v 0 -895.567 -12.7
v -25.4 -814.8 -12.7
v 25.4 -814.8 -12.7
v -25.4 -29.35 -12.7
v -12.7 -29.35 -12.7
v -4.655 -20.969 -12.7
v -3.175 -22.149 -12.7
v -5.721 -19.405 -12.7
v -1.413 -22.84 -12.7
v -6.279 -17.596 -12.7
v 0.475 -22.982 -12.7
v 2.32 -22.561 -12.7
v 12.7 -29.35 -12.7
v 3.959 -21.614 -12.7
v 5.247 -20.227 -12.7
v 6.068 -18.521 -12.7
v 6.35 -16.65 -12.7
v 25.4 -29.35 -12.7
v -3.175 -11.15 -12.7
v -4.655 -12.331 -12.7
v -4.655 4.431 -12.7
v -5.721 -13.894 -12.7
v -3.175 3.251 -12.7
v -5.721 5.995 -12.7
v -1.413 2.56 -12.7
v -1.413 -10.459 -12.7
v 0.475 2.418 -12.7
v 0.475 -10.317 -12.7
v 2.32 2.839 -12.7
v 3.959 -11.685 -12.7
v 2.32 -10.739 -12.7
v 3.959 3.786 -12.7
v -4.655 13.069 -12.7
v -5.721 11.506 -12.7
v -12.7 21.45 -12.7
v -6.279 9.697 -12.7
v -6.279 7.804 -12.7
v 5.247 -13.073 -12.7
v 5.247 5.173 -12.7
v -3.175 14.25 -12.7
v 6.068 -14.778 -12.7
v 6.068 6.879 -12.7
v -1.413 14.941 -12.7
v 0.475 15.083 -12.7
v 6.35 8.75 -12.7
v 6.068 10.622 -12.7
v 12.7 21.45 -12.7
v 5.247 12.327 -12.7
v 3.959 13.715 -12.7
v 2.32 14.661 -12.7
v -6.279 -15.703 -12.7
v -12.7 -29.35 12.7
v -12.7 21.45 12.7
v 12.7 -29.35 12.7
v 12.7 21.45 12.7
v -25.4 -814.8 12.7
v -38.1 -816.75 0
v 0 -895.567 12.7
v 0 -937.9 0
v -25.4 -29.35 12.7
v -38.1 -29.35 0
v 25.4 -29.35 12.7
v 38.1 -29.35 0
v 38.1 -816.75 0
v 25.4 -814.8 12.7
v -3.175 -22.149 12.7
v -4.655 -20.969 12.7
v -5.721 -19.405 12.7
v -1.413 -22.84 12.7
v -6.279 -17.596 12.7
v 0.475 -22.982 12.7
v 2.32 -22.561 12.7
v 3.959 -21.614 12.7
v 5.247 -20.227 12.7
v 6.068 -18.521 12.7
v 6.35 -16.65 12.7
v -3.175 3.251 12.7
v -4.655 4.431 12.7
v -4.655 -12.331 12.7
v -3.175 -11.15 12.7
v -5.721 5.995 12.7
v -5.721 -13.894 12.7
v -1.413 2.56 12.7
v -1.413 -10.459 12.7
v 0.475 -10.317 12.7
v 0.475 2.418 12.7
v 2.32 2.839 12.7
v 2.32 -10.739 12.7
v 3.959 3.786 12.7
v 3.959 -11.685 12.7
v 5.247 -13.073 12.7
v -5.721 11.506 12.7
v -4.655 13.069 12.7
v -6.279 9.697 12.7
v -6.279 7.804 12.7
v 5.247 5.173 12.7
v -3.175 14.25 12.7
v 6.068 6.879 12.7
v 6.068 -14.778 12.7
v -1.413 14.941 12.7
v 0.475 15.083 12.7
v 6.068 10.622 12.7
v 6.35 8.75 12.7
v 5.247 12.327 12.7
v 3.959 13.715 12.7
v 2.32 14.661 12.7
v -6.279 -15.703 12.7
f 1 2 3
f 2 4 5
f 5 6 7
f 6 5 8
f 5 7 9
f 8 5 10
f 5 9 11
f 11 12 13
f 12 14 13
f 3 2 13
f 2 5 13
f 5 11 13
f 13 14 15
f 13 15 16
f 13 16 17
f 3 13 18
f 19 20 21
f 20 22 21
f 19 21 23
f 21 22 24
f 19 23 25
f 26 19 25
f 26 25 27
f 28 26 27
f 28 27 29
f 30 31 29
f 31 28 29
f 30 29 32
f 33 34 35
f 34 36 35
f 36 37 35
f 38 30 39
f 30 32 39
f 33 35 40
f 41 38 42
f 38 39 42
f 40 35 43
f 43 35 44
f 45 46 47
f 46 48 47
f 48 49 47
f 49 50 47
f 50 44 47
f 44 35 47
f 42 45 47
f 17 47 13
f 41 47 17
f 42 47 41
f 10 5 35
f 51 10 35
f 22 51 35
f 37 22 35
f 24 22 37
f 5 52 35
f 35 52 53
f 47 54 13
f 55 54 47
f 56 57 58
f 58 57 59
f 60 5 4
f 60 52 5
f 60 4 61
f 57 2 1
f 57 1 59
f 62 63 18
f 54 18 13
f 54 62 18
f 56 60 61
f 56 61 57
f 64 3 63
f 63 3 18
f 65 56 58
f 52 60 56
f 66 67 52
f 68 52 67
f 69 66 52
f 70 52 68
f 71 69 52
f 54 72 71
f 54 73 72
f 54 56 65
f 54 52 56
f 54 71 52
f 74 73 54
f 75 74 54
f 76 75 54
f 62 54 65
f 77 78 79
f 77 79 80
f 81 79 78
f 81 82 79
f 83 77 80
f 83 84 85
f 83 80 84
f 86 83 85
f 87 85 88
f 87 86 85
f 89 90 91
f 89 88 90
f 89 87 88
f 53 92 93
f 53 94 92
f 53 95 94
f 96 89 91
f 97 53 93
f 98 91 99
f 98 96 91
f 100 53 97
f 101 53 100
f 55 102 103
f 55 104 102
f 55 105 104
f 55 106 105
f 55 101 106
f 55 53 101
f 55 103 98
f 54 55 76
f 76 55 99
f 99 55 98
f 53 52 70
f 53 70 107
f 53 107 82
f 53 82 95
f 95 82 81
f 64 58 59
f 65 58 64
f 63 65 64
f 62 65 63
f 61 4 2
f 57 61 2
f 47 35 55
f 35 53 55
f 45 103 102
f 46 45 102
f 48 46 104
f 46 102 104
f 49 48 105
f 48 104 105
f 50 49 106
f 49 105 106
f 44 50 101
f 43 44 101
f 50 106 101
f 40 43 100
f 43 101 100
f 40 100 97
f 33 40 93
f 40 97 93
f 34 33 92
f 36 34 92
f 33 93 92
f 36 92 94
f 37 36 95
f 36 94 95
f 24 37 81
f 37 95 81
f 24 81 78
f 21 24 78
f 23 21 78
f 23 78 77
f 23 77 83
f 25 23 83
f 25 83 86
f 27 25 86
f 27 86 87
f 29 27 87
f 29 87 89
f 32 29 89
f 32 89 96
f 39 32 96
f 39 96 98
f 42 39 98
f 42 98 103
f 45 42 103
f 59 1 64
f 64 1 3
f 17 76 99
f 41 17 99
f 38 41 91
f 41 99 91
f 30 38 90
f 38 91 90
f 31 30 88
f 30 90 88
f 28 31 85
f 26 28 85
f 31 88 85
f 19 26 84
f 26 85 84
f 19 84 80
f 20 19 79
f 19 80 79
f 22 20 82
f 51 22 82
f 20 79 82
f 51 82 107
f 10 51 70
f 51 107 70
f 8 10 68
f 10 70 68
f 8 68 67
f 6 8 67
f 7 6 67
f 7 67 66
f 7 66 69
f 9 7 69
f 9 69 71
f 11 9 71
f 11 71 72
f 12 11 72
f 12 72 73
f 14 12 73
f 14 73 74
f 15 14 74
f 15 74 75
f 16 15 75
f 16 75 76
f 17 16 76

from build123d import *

# Parameters (mm, degrees)
F0_W     = 25.4
F0_H     = 50.8
F1_DEPTH = 12.7
F2_SIZE  = 12.69999
F3_R     = 6.35
F4_DEPTH = 25.401


# Not quite as in the source:
# - a fillet or chamfer is up to 0.001 mm smaller than in the source, because OpenCascade refuses the exact size


with BuildPart() as f1:
    # F0 (on Top) → F1 (new body, symmetric)
    with BuildSketch(Plane.XY):
        Polygon((-12.7, -29.3496451829), (-38.1, -29.3496451829), (-38.1, -816.7496451829), (0, -937.8999237629), (38.1, -816.7496451829), (38.1, -29.3496451829), (12.7, -29.3496451829), align=None)
        with Locations((0, -3.9496451829)):
            Rectangle(F0_W, F0_H)
    extrude(amount=F1_DEPTH, both=True)

    # F2 (size 12.7 in the source; OpenCascade refuses exactly that, so slightly less here)
    f2_edges = [f1.edges().sort_by_distance(p)[0] for p in [
        (38.1, -423.049645, 12.7),
        (19.05, -877.324784, 12.7),
        (-19.05, -877.324784, 12.7),
        (-38.1, -423.049645, 12.7),
        (19.05, -877.324784, -12.7),
        (-38.1, -423.049645, -12.7),
        (-19.05, -877.324784, -12.7),
        (38.1, -423.049645, -12.7),
    ]]
    chamfer(f2_edges, length=F2_SIZE)

    # F3 (on face) → F4 (cut, through all)
    with BuildSketch(Plane.XY.offset(12.7)):
        with Locations((0, 8.7503548171)):
            Circle(F3_R)
        with Locations((0, -16.6496451829)):
            Circle(F3_R)
    extrude(amount=-F4_DEPTH, mode=Mode.SUBTRACT)


solid = f1.part
